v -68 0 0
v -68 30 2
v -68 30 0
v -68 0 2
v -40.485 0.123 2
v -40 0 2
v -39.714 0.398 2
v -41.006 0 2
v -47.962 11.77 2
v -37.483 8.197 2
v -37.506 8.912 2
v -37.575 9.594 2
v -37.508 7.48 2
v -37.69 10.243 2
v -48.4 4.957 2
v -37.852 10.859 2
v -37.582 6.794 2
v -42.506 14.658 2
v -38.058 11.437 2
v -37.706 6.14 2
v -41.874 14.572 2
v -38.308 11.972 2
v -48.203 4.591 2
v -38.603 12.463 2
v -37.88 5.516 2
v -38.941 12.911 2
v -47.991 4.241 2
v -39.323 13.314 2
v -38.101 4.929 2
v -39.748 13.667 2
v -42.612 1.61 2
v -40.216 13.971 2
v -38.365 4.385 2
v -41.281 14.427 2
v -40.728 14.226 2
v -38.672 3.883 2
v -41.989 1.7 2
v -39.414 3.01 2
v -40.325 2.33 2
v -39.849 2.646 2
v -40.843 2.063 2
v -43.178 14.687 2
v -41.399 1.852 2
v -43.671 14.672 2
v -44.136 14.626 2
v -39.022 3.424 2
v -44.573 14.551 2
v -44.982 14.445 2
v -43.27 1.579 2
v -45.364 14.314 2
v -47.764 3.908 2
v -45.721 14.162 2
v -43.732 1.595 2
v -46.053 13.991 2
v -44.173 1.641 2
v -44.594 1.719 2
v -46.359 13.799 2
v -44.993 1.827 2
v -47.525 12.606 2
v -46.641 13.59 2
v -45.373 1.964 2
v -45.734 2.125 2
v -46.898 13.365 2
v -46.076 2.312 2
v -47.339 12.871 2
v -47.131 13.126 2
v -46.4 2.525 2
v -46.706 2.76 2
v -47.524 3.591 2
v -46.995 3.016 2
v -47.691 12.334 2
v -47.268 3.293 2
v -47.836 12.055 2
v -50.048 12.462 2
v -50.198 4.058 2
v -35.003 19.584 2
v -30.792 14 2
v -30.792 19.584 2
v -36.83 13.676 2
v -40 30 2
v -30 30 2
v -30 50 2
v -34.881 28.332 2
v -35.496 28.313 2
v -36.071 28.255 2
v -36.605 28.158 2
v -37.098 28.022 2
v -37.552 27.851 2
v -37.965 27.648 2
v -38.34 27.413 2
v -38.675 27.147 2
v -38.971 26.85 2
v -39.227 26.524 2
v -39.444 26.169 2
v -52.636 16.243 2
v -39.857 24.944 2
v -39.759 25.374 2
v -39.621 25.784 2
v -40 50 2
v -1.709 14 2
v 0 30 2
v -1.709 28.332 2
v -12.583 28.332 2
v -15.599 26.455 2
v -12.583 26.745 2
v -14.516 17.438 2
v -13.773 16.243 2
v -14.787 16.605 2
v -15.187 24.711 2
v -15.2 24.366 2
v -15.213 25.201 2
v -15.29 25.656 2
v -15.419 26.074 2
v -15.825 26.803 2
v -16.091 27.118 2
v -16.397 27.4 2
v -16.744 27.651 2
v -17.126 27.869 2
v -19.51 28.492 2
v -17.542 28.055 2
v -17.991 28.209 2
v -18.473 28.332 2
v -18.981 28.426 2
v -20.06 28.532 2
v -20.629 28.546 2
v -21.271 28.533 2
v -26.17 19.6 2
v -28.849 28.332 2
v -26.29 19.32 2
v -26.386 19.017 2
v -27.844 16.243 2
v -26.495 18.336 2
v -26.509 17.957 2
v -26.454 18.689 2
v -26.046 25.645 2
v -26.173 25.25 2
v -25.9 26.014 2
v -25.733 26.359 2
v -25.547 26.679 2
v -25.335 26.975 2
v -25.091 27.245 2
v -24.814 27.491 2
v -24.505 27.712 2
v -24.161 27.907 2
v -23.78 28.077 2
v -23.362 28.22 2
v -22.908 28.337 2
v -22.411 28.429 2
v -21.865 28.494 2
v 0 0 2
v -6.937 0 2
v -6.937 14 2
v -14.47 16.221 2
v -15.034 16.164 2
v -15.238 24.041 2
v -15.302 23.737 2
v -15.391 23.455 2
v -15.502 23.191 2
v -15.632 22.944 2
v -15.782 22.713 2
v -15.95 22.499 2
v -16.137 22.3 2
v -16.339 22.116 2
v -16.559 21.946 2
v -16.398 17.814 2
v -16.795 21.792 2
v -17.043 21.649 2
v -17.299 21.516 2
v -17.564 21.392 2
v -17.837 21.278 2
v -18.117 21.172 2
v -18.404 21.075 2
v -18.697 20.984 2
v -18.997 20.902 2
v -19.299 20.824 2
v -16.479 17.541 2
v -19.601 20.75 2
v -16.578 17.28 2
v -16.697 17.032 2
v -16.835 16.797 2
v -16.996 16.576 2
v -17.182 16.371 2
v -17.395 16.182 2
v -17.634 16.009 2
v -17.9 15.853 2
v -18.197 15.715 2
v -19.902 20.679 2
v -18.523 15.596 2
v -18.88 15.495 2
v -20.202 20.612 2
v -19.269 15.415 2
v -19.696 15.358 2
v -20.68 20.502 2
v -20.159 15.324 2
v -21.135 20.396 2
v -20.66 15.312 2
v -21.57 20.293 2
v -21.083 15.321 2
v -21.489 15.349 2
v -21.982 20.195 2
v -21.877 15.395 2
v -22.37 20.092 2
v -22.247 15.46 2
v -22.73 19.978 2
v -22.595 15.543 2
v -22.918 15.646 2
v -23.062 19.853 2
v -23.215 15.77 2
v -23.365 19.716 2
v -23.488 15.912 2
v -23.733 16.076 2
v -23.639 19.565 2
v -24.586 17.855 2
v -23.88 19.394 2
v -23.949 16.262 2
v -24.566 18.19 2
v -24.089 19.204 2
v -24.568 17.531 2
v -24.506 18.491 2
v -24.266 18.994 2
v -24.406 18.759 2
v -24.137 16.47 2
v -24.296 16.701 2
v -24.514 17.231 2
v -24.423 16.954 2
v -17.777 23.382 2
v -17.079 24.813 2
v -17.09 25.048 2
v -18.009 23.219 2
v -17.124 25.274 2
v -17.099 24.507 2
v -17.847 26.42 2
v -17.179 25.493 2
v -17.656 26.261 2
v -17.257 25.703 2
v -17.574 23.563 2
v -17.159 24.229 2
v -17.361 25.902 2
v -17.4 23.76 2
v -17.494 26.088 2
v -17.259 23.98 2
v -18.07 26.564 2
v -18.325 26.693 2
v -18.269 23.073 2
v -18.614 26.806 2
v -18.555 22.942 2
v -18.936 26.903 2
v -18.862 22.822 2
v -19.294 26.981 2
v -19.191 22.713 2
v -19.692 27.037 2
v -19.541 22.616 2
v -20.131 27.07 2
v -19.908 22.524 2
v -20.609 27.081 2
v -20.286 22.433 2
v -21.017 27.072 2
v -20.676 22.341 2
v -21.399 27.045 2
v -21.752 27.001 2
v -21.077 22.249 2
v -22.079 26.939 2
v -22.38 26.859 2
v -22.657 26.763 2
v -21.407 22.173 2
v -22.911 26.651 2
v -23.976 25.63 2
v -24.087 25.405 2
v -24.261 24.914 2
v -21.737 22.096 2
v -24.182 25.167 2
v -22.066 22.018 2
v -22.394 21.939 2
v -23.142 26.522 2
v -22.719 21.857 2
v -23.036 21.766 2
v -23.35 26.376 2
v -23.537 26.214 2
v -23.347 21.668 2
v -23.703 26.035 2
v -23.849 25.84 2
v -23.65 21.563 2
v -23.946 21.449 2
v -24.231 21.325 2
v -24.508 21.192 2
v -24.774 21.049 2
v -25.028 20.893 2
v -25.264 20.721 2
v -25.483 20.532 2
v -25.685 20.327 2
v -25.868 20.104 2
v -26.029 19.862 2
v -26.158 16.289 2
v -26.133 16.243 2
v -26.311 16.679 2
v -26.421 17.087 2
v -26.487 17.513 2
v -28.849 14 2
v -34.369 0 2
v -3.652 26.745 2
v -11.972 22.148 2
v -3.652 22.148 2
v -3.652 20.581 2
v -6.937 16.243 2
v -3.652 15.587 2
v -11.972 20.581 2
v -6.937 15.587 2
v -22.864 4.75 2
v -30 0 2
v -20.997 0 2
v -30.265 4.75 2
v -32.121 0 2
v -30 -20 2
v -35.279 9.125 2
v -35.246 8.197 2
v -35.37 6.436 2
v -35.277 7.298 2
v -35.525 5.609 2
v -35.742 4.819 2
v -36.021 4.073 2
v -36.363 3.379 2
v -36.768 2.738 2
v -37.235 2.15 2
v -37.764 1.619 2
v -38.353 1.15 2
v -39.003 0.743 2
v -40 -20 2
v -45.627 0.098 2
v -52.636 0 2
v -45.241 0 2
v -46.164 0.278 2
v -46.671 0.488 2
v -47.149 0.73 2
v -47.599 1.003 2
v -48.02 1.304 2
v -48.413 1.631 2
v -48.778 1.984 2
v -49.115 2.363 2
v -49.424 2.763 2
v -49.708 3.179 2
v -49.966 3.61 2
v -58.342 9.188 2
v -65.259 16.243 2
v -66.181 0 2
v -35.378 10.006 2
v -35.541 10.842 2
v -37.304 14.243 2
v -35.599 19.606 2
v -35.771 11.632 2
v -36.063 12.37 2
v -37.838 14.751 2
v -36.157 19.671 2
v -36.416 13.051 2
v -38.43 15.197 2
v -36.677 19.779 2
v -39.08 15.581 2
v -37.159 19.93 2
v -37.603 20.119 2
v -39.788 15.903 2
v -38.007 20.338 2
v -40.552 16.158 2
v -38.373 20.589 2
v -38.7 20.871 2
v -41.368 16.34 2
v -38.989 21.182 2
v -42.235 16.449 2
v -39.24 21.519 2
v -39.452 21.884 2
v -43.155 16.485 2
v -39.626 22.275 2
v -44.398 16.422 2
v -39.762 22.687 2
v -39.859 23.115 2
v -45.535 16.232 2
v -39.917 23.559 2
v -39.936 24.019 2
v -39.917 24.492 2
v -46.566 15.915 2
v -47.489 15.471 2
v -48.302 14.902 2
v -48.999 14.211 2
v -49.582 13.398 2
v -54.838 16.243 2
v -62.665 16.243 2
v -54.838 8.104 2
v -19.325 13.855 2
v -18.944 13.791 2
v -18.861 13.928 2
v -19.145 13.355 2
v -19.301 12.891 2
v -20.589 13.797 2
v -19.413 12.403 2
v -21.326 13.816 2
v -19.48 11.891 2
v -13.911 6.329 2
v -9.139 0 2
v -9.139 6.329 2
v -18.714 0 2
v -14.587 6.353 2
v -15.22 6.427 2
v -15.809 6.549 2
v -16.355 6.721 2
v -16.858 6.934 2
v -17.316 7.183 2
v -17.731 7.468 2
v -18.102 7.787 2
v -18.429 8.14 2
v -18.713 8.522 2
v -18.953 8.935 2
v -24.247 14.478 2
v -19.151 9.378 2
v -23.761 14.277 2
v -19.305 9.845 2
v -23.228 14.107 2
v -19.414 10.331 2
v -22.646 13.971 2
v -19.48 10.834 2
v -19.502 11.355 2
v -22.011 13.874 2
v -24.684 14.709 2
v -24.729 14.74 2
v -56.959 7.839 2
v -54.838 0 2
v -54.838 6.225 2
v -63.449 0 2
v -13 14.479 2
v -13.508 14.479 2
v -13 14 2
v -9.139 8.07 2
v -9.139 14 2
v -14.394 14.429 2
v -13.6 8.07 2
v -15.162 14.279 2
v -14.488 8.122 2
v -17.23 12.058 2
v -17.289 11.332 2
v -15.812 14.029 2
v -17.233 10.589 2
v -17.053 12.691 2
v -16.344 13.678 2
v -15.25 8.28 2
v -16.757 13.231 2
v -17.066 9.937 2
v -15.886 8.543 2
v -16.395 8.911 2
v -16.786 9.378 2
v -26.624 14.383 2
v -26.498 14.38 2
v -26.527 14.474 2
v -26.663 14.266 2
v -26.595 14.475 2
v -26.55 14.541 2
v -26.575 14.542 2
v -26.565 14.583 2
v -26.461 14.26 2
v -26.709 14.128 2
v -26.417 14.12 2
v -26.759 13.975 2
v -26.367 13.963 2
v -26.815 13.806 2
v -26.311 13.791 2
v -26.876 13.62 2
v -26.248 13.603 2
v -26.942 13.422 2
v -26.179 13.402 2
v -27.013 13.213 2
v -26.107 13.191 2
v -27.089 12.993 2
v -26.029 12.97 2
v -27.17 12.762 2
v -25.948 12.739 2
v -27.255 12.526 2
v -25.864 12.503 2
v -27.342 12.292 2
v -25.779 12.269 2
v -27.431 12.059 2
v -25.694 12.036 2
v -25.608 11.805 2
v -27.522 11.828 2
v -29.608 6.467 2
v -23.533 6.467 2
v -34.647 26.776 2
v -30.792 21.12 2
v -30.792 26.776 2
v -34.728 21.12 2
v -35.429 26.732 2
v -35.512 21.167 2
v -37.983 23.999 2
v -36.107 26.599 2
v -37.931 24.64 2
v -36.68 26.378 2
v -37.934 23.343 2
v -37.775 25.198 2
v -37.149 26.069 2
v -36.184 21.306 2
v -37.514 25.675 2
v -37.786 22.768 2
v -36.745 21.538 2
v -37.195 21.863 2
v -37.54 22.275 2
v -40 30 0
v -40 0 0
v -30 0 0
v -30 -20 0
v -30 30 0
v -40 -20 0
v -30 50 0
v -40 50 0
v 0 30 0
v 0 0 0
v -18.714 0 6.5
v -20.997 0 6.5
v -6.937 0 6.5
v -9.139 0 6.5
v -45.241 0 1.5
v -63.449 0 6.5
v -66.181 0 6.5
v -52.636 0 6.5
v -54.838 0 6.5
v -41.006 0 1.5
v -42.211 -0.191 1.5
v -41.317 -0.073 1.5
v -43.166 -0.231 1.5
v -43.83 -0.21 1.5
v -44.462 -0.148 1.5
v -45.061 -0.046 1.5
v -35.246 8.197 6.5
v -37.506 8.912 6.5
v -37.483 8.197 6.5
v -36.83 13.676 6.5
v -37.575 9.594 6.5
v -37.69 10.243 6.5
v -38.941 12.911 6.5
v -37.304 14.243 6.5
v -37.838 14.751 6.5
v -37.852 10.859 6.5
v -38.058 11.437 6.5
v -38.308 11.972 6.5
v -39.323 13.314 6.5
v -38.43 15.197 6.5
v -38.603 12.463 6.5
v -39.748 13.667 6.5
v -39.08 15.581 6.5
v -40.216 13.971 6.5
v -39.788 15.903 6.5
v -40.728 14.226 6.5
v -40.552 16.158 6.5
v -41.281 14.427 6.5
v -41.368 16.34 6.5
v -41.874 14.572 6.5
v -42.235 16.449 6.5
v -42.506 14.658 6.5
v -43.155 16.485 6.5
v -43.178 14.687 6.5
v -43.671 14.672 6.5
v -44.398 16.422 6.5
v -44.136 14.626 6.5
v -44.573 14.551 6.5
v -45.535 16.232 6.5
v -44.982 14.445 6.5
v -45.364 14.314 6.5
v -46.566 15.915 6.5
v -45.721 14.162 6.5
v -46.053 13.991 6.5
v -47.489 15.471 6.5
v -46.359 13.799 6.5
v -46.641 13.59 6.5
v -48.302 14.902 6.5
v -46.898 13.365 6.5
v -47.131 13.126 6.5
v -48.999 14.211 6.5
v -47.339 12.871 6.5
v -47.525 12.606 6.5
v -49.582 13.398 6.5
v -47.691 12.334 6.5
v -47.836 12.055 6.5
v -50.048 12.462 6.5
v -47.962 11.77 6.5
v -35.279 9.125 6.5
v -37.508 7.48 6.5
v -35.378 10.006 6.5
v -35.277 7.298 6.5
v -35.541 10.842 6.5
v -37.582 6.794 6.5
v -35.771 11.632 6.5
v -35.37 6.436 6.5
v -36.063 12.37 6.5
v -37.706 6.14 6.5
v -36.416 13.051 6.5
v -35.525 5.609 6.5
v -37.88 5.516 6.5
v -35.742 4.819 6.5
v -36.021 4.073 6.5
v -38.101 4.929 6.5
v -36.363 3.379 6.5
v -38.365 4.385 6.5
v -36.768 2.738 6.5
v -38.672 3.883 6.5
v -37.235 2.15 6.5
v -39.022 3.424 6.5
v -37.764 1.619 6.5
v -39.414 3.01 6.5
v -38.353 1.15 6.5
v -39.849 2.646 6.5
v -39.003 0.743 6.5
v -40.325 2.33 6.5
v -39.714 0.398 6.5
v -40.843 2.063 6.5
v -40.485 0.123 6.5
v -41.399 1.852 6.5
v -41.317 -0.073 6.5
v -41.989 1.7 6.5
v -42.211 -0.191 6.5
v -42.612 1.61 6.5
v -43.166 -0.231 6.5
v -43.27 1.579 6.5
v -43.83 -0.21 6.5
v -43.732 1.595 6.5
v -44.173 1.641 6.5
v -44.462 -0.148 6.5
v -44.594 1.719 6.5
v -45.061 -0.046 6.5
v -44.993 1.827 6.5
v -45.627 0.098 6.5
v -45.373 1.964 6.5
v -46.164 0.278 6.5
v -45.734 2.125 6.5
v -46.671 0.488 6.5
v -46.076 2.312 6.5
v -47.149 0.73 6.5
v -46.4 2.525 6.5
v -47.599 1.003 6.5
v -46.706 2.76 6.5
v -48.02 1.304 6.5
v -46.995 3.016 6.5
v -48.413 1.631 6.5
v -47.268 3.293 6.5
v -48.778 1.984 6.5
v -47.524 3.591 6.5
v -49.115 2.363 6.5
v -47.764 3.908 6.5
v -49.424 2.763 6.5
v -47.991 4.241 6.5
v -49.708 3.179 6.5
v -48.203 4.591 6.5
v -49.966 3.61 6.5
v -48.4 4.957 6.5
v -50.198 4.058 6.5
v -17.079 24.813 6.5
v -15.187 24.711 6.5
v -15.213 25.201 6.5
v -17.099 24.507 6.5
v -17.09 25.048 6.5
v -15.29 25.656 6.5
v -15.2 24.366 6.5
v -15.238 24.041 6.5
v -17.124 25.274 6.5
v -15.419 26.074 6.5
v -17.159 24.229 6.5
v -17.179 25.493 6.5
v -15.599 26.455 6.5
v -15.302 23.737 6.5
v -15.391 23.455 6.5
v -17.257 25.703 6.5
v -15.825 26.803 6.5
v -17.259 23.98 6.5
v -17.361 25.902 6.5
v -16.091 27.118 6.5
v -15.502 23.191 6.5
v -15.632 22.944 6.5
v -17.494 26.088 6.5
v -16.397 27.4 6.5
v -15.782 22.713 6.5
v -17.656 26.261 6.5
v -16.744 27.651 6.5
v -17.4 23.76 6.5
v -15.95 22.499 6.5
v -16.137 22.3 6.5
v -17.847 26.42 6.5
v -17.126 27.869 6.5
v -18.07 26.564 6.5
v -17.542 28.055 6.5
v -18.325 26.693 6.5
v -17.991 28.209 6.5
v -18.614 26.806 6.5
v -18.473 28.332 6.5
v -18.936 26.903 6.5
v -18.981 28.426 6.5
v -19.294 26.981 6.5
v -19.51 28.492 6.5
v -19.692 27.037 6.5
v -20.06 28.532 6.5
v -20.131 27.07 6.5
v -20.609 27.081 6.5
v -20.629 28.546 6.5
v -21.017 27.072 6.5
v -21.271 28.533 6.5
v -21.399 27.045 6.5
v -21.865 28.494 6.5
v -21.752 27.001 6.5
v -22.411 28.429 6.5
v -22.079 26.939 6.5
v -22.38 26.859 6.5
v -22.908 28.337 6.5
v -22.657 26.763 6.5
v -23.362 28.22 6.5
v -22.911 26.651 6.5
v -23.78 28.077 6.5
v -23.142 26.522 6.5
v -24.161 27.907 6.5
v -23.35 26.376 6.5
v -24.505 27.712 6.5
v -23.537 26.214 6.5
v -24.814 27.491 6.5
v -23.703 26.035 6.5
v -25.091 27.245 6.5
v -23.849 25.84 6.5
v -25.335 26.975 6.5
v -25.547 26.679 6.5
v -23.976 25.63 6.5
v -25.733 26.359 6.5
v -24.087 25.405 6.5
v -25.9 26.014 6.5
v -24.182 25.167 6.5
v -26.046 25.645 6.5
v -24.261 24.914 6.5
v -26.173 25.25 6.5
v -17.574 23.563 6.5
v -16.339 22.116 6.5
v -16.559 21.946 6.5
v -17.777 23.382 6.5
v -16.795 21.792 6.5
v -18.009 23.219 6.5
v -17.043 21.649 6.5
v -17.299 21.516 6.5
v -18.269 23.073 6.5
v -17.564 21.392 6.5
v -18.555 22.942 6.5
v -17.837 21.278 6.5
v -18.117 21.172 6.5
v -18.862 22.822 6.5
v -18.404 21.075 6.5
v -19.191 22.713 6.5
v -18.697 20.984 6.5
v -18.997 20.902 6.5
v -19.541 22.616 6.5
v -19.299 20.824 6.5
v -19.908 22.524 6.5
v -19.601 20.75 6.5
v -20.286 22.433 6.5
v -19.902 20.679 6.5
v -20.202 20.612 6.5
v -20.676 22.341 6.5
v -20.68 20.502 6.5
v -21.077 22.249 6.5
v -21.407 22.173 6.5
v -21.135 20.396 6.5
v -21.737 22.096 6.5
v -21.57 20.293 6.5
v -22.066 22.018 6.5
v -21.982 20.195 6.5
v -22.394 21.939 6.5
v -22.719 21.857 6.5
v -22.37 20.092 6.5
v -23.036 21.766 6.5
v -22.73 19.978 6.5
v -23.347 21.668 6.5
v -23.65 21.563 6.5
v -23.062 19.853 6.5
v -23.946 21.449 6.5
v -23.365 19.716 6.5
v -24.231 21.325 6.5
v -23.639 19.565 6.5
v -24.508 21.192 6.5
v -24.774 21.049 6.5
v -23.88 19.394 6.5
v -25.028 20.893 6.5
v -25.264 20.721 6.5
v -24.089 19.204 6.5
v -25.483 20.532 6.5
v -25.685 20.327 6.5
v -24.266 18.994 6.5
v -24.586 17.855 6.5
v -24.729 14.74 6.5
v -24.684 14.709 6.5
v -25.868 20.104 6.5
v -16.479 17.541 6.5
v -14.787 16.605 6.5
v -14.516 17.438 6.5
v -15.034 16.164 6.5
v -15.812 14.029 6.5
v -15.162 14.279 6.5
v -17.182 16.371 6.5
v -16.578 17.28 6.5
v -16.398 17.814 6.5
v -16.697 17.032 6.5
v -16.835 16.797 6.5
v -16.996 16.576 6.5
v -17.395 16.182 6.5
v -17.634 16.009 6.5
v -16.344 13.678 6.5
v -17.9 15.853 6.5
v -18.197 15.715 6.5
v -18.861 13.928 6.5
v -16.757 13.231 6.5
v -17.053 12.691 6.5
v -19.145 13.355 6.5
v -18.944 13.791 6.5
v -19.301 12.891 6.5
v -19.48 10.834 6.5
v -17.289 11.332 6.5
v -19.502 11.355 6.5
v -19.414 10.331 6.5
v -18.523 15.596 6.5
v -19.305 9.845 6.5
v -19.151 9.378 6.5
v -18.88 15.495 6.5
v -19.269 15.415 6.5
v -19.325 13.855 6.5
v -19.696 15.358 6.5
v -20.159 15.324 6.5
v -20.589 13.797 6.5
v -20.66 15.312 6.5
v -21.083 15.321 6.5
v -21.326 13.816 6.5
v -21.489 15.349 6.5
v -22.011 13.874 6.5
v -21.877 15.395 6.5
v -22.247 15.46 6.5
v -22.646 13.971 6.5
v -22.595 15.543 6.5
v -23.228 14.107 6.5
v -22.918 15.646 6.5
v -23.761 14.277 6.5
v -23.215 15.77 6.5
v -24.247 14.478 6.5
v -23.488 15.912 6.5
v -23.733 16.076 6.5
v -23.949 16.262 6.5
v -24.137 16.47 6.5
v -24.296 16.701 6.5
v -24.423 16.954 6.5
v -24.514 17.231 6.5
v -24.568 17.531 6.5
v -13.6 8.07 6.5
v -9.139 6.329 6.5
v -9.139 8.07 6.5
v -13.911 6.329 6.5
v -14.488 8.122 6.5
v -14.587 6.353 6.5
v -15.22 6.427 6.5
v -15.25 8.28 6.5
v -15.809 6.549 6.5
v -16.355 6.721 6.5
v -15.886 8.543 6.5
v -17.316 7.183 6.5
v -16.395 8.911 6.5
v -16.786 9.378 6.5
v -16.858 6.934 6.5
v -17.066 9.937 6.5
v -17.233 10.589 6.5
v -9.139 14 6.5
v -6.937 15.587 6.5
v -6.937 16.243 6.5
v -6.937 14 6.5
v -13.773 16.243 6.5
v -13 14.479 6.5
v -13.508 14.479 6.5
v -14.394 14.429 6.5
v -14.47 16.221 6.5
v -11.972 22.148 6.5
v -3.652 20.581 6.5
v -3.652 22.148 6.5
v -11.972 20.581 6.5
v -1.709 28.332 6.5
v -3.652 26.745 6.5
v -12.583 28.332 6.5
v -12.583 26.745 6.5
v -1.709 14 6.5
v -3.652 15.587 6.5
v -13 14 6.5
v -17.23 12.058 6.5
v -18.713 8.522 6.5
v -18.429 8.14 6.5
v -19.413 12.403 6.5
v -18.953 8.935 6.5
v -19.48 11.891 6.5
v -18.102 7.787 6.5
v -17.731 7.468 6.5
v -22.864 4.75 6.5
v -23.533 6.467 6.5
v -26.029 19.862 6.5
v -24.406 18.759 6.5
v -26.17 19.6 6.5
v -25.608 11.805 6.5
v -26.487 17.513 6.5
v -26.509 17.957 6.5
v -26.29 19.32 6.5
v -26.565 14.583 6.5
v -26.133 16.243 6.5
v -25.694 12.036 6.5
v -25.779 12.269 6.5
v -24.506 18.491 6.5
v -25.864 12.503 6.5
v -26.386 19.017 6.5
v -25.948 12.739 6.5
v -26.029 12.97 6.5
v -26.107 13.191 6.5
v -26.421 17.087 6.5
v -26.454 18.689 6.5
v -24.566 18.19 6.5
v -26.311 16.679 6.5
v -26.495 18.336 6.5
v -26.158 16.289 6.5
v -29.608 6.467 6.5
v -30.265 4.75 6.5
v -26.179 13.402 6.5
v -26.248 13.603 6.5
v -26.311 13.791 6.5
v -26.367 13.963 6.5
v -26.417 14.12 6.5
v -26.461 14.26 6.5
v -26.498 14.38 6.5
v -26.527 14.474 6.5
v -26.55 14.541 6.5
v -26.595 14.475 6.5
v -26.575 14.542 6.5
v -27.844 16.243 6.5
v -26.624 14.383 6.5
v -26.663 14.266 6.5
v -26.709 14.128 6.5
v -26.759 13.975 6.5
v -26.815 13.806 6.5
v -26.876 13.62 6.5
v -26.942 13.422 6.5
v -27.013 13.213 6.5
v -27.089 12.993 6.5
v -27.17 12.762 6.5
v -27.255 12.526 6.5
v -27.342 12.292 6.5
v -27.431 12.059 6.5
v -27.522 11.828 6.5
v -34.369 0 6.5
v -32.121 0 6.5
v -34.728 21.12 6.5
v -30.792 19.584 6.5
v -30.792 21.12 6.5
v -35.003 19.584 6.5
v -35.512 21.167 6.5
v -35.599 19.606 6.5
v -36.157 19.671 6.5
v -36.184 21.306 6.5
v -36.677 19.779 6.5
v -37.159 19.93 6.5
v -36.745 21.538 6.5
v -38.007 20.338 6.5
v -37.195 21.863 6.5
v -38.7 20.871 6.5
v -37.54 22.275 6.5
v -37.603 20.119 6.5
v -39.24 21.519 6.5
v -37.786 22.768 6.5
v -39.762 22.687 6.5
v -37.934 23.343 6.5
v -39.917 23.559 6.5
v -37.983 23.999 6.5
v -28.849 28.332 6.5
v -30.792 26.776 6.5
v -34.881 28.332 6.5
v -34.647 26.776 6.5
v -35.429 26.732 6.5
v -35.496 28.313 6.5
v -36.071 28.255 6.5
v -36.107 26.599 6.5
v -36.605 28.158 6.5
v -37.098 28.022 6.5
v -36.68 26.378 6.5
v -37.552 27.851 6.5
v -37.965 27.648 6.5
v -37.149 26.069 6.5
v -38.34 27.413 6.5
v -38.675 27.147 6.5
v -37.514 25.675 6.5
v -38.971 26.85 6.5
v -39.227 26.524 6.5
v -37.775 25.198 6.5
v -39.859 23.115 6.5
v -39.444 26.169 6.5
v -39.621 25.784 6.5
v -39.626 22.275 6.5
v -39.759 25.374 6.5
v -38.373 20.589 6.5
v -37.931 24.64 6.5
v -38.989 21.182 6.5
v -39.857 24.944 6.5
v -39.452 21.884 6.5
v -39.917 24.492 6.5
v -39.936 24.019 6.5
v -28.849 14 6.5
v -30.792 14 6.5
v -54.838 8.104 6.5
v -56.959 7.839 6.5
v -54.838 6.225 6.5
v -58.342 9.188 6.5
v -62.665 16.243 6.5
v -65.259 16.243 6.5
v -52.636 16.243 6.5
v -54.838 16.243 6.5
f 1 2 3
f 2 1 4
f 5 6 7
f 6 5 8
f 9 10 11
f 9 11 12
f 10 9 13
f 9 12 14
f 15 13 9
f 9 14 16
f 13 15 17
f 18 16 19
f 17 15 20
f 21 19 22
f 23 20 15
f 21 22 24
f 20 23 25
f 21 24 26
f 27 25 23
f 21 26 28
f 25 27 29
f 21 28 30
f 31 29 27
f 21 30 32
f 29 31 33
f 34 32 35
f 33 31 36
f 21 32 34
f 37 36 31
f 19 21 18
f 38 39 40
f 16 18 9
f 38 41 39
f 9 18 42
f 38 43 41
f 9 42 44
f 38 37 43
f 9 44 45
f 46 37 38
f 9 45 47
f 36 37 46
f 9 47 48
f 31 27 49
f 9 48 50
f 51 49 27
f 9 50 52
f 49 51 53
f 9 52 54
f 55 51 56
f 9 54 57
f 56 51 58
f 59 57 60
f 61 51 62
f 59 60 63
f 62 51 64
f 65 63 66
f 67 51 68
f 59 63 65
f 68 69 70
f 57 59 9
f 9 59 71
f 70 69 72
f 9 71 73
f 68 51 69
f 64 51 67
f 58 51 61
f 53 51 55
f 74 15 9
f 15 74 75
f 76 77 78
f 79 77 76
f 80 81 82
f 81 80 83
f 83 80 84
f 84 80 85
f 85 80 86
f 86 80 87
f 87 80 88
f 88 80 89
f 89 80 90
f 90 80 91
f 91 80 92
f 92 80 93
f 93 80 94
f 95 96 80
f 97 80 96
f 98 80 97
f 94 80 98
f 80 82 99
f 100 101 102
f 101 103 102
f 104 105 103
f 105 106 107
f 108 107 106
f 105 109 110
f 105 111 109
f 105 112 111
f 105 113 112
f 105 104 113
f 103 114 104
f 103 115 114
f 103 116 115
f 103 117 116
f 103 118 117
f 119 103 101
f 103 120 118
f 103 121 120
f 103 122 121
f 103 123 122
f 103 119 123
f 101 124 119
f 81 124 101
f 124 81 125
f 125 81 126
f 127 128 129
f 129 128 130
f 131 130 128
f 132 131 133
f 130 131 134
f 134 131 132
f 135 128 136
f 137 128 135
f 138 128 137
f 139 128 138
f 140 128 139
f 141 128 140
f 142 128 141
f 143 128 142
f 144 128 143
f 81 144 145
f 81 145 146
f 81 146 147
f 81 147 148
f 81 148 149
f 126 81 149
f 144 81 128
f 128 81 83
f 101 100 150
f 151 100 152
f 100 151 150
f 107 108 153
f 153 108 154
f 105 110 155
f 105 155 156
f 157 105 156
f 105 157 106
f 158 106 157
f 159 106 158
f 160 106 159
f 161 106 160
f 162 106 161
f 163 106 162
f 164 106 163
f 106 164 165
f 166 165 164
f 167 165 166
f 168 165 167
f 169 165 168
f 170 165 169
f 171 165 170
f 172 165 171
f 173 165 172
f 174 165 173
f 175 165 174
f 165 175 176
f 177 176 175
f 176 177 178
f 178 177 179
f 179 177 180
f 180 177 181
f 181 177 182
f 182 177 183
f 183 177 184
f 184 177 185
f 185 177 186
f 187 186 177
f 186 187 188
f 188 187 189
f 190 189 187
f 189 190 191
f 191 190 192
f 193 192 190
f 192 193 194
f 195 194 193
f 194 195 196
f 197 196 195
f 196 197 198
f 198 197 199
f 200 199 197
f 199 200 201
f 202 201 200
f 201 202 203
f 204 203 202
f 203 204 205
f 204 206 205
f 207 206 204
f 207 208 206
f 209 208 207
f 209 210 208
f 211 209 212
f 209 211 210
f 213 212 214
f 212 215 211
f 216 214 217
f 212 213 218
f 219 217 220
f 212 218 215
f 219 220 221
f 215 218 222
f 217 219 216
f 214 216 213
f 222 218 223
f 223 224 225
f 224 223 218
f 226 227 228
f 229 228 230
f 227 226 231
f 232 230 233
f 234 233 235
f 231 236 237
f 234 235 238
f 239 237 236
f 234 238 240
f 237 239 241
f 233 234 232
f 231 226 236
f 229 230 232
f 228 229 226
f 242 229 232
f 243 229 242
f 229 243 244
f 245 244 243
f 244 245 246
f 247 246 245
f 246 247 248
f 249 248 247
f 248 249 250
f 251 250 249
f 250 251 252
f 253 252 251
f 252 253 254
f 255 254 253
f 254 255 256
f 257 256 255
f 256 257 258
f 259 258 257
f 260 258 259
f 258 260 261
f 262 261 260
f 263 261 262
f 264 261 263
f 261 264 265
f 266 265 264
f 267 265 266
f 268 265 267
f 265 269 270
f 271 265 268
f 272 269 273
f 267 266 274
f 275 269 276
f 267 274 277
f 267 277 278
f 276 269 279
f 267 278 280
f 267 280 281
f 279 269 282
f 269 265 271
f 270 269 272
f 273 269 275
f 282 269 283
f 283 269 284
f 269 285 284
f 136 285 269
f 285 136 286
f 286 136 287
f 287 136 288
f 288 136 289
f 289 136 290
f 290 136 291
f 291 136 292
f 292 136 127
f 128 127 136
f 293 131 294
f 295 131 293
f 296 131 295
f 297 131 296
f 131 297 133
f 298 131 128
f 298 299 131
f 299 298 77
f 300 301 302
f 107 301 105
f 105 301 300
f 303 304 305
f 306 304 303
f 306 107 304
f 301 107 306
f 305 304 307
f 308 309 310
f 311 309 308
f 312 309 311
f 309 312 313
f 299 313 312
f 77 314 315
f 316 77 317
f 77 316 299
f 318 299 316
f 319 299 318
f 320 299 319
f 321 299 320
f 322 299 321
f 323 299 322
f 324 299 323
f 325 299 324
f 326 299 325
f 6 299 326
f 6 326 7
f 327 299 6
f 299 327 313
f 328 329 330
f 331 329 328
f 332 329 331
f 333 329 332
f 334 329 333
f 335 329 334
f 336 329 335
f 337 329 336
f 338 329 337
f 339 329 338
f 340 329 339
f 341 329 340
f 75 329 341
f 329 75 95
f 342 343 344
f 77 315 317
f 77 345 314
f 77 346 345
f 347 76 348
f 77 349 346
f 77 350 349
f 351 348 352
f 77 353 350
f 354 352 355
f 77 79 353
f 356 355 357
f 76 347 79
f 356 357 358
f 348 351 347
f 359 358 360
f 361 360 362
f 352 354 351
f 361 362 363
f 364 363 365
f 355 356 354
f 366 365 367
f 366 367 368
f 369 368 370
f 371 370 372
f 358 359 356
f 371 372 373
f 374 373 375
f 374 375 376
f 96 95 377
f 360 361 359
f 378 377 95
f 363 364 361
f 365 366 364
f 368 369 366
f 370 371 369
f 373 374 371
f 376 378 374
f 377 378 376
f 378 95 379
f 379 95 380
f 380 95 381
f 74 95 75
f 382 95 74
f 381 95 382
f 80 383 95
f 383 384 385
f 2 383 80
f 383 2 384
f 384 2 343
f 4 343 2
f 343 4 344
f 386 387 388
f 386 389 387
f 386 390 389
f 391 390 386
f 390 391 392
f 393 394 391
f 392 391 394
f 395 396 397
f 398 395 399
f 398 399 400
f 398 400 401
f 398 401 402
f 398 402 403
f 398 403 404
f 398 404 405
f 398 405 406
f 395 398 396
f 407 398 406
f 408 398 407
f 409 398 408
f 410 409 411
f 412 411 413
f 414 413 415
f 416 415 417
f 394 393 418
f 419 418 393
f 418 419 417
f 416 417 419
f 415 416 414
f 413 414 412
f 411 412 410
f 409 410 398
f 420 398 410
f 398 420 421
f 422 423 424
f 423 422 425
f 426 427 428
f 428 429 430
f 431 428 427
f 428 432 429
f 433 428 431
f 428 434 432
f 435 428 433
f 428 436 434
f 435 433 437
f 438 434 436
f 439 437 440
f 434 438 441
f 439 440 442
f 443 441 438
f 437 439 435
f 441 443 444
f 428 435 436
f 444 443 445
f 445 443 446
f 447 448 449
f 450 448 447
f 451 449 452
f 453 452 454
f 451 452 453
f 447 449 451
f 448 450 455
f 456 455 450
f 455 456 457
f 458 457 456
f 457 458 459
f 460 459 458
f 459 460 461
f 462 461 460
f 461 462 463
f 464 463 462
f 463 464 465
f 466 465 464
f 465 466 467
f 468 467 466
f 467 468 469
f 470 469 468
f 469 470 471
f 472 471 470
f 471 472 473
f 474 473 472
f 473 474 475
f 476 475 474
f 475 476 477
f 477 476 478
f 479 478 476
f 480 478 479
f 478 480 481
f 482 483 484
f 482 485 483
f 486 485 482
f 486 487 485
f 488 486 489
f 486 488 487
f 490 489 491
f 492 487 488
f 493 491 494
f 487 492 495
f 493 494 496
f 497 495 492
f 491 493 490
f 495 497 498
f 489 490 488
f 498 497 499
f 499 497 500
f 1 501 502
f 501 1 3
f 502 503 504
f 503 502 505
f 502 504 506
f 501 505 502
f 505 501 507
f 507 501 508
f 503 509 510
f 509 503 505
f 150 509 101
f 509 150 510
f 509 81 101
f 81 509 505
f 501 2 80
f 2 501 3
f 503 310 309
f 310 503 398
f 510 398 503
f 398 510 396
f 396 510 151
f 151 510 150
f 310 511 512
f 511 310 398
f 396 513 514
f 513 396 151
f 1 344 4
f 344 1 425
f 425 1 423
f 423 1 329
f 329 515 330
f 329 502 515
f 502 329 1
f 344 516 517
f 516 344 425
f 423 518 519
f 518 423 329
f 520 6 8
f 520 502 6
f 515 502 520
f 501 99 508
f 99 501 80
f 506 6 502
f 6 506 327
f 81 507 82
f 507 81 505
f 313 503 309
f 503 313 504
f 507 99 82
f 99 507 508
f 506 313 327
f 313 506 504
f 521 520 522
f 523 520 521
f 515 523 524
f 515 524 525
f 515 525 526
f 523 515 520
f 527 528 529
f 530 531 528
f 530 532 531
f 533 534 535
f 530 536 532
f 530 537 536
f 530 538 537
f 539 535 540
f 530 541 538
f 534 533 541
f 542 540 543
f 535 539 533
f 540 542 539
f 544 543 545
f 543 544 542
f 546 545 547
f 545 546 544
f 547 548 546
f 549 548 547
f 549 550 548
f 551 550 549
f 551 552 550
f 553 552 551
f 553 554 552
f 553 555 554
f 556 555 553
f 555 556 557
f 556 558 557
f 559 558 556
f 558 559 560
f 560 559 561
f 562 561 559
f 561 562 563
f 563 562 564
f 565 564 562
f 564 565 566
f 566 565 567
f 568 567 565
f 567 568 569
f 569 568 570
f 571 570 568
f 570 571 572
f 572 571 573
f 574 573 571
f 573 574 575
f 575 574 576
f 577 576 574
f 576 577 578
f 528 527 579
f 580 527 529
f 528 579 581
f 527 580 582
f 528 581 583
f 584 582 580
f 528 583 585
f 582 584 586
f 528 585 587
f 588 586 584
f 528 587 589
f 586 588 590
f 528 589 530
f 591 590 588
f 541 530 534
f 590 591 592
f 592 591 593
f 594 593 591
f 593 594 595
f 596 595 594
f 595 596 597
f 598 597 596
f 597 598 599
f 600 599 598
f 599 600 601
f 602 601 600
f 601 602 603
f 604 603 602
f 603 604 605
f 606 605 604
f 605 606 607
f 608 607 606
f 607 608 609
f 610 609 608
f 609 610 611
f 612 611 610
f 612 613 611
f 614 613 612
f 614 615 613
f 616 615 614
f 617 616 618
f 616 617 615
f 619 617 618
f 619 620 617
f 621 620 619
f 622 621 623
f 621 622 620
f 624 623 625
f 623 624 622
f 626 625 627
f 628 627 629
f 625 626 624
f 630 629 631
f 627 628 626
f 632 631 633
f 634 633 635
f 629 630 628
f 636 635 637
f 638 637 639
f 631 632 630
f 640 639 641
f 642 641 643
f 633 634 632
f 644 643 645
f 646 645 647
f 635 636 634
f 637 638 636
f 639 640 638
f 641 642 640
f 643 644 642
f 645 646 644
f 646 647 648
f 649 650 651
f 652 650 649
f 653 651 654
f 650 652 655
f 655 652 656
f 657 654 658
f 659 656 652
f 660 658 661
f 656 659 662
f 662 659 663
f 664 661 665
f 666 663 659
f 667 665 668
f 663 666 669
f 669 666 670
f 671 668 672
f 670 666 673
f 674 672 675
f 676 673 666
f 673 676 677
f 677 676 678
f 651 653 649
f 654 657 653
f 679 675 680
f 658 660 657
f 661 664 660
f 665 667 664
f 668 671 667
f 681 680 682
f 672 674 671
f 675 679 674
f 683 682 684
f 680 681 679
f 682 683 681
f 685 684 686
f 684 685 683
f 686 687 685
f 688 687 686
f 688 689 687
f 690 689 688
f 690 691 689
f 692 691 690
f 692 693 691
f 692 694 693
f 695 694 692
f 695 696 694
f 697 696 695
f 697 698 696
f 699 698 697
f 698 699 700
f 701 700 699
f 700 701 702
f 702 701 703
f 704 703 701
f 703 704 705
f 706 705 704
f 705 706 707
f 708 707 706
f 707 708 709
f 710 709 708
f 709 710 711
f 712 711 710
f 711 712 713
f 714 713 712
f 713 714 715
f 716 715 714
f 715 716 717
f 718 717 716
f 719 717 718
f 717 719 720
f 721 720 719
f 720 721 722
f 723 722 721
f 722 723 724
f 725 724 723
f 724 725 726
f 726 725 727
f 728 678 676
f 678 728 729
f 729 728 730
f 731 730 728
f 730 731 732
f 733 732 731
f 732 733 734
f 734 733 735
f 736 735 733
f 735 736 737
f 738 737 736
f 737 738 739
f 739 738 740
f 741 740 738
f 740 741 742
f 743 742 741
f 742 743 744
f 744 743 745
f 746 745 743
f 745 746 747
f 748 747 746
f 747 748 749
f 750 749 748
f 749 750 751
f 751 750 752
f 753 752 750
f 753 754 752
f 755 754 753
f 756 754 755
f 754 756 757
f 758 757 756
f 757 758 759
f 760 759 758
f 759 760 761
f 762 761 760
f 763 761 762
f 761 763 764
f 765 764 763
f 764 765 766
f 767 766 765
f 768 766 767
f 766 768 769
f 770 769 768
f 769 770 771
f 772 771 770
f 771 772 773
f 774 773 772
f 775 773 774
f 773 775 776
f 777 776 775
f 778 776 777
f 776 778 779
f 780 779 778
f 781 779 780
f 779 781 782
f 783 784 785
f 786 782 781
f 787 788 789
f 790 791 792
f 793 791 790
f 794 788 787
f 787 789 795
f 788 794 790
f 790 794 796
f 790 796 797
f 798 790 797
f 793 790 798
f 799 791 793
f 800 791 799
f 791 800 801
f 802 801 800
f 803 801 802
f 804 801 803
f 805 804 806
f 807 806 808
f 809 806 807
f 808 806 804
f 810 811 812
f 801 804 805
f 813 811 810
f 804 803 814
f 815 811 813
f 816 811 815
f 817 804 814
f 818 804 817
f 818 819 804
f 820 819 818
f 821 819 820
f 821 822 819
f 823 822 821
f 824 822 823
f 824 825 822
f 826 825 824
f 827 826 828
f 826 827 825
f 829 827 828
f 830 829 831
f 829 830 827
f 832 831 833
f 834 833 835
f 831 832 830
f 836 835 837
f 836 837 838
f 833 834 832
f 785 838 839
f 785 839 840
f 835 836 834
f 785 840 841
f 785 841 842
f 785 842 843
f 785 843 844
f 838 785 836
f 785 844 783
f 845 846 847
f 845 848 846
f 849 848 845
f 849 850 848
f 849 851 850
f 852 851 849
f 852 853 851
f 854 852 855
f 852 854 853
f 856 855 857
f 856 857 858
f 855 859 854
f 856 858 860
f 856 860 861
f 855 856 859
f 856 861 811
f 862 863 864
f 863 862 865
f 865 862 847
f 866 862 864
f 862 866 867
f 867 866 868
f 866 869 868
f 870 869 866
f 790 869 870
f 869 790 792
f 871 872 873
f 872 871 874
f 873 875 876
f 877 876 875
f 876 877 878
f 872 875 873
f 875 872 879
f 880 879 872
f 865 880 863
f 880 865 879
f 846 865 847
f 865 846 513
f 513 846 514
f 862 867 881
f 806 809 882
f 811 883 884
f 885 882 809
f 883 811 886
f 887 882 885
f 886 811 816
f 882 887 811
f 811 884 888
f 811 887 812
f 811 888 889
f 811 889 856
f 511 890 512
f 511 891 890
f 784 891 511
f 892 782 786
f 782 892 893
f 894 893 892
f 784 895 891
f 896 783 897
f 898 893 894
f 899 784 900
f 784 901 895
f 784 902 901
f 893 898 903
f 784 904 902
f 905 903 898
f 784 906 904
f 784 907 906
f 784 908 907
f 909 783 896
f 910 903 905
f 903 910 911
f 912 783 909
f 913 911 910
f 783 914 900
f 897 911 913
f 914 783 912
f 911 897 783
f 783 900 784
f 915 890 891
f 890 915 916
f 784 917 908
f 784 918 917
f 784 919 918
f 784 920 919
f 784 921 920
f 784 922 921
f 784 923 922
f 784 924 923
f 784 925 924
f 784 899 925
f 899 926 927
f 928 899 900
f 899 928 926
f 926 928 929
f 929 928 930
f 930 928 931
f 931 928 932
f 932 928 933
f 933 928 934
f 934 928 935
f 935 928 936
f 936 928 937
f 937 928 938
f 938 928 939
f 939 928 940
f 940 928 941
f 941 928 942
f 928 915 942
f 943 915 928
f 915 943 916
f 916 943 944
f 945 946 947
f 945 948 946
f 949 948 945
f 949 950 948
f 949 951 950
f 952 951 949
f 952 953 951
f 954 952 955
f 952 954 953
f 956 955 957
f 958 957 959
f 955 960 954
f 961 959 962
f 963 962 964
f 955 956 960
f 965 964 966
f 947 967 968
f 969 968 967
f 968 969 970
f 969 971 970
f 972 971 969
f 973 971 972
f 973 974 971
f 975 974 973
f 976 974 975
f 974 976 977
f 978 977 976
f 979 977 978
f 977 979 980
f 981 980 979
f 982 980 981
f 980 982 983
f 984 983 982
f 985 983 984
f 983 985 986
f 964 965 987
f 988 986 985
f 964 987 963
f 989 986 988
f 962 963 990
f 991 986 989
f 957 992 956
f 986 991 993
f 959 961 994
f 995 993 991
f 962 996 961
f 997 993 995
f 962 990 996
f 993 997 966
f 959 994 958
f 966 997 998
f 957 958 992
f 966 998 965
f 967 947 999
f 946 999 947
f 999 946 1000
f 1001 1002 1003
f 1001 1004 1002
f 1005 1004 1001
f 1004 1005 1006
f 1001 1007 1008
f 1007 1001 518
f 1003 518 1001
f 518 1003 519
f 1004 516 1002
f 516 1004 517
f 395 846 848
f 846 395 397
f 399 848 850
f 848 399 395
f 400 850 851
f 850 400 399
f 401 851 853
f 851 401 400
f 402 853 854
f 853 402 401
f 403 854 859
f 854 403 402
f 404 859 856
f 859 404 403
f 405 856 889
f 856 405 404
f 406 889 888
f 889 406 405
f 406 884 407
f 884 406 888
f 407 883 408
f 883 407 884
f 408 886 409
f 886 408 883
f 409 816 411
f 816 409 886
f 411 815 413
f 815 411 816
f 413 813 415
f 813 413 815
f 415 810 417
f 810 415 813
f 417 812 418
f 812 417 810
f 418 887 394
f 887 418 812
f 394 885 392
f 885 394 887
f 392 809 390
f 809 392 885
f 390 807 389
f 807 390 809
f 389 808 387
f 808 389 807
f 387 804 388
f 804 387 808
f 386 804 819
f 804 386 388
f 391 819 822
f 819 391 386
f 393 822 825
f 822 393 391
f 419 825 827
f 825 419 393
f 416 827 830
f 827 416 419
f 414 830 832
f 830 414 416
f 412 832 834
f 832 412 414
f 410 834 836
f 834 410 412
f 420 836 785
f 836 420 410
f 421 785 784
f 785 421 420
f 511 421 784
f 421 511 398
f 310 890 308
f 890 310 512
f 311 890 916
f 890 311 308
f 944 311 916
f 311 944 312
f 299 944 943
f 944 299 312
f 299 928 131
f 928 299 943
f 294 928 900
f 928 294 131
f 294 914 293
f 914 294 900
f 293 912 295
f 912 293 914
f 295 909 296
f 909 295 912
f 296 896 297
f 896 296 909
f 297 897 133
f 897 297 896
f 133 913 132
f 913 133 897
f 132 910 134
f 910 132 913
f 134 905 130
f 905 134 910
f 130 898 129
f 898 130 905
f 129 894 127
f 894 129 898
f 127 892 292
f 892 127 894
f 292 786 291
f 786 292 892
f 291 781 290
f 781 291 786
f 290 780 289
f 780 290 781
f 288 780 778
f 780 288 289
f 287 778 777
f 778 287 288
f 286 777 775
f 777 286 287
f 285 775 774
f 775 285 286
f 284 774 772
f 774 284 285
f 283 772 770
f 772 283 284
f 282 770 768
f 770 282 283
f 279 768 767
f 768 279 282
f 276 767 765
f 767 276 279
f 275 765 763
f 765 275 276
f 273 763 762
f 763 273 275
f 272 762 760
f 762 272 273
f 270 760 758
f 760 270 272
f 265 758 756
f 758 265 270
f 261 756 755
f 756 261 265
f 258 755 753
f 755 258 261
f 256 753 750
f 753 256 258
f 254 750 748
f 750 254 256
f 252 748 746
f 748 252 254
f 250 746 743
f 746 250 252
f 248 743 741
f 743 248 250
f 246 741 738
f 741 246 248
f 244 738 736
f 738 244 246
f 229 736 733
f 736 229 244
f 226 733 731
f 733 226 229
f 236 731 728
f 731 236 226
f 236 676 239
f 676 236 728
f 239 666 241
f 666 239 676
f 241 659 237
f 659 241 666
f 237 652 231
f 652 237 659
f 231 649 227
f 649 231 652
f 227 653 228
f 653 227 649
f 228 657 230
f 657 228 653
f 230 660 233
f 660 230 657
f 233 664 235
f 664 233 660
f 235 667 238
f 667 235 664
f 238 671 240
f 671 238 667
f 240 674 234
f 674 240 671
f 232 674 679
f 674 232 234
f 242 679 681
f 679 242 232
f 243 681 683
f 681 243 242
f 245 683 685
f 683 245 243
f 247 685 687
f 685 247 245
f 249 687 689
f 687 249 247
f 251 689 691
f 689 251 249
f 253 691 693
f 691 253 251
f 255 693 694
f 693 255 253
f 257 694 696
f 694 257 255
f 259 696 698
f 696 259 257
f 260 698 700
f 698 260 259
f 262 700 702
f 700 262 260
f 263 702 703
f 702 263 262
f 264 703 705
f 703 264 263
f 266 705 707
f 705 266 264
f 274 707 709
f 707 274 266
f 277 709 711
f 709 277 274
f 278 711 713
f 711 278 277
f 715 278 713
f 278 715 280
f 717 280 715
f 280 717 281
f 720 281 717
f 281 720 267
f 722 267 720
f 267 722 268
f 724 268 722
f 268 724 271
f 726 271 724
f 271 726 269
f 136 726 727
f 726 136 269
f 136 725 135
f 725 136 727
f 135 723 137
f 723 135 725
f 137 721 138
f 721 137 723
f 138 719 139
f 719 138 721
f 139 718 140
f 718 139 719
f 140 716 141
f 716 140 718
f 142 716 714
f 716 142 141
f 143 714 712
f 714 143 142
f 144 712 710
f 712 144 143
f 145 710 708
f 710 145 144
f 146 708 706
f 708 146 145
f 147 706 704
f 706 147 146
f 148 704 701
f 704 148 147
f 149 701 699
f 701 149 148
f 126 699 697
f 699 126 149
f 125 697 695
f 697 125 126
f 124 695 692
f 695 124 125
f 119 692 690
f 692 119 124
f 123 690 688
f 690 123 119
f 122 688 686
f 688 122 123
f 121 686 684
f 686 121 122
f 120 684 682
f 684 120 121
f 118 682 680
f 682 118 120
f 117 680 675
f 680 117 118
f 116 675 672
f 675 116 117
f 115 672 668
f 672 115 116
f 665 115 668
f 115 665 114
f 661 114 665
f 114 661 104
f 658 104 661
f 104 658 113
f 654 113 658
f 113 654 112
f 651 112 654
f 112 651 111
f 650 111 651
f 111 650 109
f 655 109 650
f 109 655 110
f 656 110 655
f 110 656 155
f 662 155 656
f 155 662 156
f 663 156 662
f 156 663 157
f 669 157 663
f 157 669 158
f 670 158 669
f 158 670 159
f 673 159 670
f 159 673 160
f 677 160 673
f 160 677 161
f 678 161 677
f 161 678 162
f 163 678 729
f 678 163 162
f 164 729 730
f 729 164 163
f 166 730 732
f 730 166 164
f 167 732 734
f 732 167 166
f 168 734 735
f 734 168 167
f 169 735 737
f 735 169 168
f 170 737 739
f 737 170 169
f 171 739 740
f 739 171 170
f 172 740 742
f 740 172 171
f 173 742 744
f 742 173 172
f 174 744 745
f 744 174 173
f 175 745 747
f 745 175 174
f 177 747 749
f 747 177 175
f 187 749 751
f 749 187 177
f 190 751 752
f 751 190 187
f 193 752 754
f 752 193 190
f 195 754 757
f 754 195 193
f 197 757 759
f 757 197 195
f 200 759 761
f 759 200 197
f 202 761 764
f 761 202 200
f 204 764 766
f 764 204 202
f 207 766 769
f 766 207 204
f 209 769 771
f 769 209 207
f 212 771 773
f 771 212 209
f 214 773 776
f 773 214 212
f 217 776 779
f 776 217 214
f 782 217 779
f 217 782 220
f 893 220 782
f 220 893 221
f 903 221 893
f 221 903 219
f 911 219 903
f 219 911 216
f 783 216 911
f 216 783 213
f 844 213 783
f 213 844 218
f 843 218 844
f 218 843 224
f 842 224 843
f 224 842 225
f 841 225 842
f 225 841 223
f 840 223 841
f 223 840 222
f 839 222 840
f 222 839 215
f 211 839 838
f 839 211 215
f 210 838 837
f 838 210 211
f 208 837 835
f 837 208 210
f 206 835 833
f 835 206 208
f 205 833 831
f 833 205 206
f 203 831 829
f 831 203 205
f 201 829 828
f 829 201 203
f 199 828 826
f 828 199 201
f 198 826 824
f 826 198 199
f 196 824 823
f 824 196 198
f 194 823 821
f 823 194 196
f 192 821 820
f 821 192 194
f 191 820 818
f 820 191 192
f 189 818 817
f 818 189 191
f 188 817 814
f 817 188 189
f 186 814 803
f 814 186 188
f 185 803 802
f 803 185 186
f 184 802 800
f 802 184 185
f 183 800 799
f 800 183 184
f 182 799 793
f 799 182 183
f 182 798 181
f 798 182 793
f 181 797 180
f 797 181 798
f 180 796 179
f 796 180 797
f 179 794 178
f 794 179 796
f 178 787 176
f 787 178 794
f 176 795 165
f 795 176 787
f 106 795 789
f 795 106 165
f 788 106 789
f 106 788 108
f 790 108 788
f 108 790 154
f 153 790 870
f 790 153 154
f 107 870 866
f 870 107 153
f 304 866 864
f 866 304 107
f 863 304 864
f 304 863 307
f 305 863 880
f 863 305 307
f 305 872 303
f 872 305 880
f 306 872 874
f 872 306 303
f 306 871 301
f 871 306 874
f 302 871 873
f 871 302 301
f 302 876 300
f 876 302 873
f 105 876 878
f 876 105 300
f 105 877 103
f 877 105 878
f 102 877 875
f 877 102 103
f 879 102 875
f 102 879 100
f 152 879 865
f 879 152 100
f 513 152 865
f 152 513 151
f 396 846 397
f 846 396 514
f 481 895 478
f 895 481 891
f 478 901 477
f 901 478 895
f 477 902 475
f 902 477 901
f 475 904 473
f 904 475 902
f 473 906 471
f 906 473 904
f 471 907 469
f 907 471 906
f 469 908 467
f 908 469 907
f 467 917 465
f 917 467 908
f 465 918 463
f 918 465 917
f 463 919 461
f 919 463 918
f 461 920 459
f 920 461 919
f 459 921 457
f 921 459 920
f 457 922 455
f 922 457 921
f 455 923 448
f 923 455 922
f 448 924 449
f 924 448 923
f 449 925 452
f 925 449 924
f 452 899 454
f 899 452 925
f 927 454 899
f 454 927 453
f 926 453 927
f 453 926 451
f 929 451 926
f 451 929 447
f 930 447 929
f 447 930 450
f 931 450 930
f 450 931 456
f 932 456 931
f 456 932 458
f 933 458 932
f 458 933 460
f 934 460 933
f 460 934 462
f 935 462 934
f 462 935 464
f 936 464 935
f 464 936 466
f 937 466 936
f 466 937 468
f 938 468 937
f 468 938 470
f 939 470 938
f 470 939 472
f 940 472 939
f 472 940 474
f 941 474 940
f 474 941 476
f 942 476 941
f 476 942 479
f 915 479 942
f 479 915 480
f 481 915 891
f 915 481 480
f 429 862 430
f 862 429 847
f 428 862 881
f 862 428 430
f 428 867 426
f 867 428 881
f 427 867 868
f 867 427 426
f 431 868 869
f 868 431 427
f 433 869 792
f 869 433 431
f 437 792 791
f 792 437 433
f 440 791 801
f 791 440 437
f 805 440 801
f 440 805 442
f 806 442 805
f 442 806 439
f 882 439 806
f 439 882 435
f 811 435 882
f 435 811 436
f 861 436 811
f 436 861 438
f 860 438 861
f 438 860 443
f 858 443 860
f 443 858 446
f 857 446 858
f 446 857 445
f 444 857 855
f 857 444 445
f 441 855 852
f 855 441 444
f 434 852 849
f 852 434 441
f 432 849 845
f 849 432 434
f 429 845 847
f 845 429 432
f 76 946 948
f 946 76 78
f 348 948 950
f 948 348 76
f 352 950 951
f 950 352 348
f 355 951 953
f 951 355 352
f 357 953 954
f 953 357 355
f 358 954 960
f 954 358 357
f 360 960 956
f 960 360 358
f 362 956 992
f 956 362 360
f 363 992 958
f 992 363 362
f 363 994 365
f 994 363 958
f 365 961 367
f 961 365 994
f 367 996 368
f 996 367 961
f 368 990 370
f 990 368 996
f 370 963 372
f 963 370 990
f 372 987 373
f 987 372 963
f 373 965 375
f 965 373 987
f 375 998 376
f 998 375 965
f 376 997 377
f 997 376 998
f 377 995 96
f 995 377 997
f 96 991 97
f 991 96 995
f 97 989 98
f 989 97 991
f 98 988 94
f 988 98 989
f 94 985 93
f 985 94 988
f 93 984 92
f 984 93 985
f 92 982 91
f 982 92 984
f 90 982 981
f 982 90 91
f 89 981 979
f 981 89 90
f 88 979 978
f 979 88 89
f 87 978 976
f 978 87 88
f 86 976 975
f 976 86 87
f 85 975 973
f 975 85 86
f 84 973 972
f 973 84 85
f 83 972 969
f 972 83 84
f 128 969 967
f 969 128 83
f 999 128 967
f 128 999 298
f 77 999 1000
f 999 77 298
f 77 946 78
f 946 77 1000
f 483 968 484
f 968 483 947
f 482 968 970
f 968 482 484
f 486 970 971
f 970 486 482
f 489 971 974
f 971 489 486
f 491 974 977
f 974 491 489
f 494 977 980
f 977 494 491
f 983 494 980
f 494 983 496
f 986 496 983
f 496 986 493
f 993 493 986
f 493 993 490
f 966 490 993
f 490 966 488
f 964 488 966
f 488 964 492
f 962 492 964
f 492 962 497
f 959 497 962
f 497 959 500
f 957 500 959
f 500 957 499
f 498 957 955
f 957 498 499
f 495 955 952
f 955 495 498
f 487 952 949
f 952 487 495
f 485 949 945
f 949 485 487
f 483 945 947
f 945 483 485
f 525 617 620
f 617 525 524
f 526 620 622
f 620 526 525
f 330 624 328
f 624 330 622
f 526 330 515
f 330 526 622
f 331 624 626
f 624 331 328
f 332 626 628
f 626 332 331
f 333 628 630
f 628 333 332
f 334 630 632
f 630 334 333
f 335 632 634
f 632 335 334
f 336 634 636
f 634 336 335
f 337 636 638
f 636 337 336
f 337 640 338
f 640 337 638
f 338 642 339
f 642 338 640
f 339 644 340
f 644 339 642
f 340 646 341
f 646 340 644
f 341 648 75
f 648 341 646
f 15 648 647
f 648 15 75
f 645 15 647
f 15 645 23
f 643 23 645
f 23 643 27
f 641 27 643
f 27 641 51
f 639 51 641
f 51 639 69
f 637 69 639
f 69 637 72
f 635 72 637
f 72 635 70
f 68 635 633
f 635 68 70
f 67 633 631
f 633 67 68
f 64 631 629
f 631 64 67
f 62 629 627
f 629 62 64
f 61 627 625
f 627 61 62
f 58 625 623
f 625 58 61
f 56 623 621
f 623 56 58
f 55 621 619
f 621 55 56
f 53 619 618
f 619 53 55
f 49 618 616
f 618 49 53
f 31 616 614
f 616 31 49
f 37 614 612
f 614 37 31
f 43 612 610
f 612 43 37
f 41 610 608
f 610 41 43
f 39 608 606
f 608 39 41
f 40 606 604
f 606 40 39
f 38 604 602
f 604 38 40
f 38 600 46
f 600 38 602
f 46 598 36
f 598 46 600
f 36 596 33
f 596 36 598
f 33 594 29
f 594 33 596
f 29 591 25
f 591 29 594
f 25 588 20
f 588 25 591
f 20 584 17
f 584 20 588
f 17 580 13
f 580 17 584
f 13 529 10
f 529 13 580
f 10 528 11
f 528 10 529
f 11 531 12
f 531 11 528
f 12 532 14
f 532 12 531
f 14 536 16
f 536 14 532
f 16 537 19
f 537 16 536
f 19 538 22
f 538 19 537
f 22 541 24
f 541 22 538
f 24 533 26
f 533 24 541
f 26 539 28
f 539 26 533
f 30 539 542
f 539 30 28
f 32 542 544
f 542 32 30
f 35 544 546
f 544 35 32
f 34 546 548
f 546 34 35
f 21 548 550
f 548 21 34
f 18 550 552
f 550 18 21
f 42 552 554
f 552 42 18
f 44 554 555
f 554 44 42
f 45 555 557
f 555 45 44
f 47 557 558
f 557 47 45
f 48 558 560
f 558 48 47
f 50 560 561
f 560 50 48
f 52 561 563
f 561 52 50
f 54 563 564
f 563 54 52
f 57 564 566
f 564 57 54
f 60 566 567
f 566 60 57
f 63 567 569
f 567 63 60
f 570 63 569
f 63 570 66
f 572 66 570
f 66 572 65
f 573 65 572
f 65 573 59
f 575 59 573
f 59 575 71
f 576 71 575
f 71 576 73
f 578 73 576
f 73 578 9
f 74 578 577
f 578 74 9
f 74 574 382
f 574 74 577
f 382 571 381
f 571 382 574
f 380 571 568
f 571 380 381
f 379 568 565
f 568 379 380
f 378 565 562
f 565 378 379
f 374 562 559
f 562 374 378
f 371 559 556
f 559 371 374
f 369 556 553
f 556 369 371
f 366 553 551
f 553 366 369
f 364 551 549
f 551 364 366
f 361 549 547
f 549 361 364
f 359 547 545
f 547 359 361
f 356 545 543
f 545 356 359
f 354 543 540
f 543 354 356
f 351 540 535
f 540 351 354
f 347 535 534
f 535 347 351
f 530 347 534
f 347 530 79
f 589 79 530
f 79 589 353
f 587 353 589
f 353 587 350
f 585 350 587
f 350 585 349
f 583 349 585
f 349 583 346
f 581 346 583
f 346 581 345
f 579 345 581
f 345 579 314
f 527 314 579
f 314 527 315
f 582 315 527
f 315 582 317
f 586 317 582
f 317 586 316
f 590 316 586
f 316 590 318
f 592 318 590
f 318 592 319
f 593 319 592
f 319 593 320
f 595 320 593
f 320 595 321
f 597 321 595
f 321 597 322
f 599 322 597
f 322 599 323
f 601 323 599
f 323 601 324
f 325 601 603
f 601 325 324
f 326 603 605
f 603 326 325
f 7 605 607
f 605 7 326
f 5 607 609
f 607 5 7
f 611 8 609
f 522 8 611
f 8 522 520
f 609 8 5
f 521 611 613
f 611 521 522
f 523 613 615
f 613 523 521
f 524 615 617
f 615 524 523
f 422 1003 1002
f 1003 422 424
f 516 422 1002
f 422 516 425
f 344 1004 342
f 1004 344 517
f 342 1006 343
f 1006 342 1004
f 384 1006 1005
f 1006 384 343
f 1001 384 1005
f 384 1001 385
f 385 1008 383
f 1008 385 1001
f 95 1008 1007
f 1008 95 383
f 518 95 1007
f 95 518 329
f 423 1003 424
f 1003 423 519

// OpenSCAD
// ink pad is 2.75" x 4.25"
// 69.85mm x 107.95mm

// brain image is "fikiran" is licensed under CC0 1.0 - https://svgsilh.com/ms/3f51b5/image/2750415.html

mirror([1, 0, 0]) {
  // the base, with handles
  cube([68, 30, 2]);
  translate([30, -20, 0])
    cube([10, 70, 2]);

  translate([0, 0, 1.5])
    linear_extrude(5) {
      translate([0, 14, 0])
        text("ESP", 15);
      translate([5, 0, 0])
        text("PACK", 17);
    }
}
